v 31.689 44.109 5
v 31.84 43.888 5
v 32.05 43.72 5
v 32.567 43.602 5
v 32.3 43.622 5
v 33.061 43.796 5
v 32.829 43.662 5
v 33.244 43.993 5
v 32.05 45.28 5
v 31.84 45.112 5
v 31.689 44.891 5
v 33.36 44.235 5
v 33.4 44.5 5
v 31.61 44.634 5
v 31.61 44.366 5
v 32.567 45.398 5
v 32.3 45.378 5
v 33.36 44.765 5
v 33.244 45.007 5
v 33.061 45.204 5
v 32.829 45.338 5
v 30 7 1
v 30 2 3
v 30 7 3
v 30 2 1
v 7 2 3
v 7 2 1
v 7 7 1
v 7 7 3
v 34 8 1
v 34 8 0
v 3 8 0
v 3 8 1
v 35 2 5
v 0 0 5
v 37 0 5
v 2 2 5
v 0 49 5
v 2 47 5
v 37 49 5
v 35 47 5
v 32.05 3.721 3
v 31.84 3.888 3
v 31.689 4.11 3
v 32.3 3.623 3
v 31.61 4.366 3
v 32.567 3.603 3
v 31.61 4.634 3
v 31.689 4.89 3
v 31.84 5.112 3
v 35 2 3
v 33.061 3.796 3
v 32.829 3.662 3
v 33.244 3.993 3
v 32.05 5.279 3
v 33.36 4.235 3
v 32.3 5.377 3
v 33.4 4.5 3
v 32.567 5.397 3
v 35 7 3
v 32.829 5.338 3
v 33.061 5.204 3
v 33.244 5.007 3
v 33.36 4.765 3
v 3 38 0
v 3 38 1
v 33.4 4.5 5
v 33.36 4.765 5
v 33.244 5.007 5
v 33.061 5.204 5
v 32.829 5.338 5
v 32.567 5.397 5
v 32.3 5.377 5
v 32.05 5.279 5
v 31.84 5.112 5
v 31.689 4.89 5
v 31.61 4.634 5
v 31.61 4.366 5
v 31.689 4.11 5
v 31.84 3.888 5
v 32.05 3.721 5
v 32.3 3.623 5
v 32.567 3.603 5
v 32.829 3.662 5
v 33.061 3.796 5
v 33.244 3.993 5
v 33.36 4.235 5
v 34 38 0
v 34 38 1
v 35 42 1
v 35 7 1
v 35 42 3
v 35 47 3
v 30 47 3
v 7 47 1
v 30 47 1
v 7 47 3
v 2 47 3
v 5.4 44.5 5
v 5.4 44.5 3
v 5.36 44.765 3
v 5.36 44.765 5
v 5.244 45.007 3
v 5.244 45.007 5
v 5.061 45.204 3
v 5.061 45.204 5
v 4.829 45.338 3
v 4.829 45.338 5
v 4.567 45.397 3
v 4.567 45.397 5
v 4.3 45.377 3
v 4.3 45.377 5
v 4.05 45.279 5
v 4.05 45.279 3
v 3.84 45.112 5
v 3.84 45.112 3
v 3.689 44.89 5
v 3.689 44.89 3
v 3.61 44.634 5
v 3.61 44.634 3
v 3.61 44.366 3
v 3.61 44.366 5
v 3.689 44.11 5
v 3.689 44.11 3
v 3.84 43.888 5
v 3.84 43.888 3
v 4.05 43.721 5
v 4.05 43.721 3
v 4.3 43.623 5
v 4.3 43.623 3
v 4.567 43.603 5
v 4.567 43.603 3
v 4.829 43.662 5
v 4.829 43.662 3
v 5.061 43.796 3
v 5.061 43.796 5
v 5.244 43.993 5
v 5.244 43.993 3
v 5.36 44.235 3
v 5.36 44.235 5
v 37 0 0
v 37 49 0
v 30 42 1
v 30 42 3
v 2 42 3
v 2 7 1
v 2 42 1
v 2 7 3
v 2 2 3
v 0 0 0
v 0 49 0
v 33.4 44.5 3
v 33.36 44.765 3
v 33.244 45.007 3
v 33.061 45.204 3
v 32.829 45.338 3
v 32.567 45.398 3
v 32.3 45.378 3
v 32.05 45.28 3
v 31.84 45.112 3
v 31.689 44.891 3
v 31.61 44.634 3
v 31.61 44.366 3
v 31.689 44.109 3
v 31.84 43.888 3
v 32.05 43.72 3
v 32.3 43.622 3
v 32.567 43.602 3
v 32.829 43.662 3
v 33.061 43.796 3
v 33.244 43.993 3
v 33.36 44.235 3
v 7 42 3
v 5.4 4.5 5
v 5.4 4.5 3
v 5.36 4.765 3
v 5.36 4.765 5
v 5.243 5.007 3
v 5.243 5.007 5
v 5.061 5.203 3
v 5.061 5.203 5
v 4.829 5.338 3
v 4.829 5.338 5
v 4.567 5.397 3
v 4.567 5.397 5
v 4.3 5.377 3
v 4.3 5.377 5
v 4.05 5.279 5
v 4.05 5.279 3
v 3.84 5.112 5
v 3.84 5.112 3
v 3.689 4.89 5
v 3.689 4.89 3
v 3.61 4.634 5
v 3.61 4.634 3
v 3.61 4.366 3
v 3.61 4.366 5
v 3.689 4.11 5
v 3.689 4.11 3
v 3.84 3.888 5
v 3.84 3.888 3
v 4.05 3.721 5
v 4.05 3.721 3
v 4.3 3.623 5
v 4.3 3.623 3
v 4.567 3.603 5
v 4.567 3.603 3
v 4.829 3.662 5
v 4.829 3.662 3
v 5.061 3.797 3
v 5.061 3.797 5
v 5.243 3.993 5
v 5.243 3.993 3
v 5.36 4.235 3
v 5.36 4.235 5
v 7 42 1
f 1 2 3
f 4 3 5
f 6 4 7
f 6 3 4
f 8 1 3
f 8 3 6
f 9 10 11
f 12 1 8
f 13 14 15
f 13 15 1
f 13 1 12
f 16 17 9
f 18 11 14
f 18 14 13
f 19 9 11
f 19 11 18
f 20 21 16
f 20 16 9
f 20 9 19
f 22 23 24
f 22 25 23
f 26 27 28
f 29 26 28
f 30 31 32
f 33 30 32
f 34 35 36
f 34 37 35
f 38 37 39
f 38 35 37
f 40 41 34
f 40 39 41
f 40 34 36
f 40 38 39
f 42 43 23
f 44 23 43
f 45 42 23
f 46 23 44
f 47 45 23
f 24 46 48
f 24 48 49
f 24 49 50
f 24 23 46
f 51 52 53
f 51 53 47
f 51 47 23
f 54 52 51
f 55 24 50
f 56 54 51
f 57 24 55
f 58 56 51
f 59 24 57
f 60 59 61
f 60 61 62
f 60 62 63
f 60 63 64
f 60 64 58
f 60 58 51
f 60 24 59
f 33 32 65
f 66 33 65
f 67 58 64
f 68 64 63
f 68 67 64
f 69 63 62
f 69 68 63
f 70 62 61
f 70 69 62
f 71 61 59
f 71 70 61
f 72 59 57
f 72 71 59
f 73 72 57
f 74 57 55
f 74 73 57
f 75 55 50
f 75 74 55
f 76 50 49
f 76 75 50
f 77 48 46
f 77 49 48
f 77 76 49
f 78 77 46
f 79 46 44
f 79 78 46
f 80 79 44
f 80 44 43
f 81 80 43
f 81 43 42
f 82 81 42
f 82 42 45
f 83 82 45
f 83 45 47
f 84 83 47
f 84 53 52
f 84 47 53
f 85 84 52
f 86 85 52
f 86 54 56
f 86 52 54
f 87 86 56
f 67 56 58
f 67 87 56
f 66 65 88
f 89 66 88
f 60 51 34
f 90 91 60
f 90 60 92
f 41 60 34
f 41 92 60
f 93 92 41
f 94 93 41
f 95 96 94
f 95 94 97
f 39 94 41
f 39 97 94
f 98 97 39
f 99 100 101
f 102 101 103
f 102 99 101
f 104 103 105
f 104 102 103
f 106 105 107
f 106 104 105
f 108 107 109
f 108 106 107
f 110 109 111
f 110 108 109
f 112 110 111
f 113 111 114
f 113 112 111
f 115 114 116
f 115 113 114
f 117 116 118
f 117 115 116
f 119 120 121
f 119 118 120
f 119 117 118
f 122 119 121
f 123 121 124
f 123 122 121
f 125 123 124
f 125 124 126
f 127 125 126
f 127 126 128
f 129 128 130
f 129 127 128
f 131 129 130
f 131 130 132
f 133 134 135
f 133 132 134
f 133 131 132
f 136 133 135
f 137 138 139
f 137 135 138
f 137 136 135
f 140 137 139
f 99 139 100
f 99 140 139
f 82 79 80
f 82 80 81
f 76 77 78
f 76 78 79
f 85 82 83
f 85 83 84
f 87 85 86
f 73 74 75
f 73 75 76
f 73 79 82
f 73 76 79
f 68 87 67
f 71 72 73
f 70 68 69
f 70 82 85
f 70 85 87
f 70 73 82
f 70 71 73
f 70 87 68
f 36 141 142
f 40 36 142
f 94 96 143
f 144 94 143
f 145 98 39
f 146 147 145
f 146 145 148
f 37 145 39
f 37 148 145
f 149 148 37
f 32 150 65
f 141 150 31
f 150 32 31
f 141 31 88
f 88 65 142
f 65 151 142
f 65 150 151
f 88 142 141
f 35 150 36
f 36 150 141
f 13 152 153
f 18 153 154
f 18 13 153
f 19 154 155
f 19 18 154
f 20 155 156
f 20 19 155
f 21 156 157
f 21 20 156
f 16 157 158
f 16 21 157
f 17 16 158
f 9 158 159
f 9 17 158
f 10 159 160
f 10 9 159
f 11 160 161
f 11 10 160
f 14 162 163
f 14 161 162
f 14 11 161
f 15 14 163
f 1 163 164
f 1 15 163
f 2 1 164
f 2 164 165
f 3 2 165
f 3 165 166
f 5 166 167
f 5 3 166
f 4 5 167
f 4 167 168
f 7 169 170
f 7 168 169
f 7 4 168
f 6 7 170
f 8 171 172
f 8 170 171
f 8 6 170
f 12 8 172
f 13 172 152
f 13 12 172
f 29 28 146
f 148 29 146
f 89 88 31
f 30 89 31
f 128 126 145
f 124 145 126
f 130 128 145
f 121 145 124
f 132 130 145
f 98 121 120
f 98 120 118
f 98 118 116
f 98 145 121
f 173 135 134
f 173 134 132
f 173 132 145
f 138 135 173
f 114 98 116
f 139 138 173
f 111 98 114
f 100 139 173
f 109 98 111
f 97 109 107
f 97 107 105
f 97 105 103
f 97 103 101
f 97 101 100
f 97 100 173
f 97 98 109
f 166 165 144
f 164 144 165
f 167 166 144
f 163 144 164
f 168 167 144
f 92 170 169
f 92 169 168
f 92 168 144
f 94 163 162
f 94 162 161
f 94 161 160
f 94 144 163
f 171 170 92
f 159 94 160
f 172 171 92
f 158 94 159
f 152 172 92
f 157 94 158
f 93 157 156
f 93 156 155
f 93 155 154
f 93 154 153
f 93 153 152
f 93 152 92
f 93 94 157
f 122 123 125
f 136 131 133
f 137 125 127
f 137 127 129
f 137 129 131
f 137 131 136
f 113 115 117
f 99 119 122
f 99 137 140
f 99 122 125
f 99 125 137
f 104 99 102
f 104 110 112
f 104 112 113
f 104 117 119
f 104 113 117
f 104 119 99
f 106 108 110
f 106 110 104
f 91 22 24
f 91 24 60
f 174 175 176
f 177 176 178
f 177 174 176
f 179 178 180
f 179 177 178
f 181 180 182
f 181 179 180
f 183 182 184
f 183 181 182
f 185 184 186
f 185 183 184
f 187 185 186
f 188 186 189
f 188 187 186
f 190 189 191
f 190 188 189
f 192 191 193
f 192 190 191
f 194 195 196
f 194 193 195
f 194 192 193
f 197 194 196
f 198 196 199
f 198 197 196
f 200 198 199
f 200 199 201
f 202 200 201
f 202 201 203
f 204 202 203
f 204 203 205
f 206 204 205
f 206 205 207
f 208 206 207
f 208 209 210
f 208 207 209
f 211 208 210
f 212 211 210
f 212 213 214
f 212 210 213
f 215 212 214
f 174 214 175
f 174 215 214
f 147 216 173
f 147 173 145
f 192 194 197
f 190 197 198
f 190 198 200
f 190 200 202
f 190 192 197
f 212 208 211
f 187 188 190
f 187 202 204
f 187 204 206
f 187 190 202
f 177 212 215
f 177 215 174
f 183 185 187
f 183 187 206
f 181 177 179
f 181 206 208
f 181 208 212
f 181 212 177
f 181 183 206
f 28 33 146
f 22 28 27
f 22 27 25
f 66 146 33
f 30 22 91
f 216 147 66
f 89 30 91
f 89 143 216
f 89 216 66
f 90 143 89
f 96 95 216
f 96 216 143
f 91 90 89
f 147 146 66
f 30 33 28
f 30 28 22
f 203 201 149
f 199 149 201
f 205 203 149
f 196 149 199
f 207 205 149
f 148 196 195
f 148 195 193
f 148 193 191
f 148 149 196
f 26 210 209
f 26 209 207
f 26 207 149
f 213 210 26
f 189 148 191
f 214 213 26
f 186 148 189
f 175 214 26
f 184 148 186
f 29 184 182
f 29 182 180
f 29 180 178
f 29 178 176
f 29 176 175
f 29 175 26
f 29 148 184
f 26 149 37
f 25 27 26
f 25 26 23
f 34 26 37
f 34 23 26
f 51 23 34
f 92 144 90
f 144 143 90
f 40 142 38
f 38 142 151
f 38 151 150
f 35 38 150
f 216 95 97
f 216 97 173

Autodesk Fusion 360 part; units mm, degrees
sketch "Sketch1" plane through (0, 0, 0) normal (0, 0, 1) x (1, 0, 0)
  line L0 (0, 0) -> (37, 0)
  line L1 (37, 0) -> (37, 49)
  line L2 (37, 49) -> (0, 49)
  line L3 (0, 49) -> (0, 0)
  line L4 (2, 2) -> (35, 2)
  line L5 (35, 2) -> (35, 47)
  line L6 (35, 47) -> (2, 47)
  line L7 (2, 47) -> (2, 2)
  circle A0 centre (4.5, 4.5) radius 0.8998
  circle A1 centre (32.5, 4.5) radius 0.9
  circle A2 centre (32.5, 44.5) radius 0.9002
  circle A3 centre (4.5, 44.5) radius 0.8999
  line L8 (3, 38) -> (34, 38)
  line L9 (34, 38) -> (34, 8)
  line L10 (34, 8) -> (3, 8)
  line L11 (3, 8) -> (3, 38)
  line L12 (2, 47) -> (7, 47)
  line L13 (7, 47) -> (7, 42)
  line L14 (7, 42) -> (2, 42)
  line L15 (2, 42) -> (2, 47)
  line L16 (35, 47) -> (30, 47)
  line L17 (30, 47) -> (30, 42)
  line L18 (30, 42) -> (35, 42)
  line L19 (35, 42) -> (35, 47)
  line L20 (35, 2) -> (30, 2)
  line L21 (30, 2) -> (30, 7)
  line L22 (30, 7) -> (35, 7)
  line L23 (35, 7) -> (35, 2)
  line L24 (2, 2) -> (7, 2)
  line L25 (7, 2) -> (7, 7)
  line L26 (7, 7) -> (2, 7)
  line L27 (2, 7) -> (2, 2)
extrude "Extrude1" add sketch "Sketch1" along normal blind 1 contours L0 L1 L2 L3 | L4 L7 L24 L25 L26 L27 | L4 L5 L6 L7 L13 L14 L17 L18 L21 L22 L25 L26 | L4 L5 L20 L21 L22 L23 | L6 L7 L12 L13 L14 L15 | L5 L6 L16 L17 L18 L19 | A0 | A1 | A2 | A3
extrude "Extrude2" cut sketch "Sketch1" along normal blind 4 contours L4 L7 L24 L25 L26 L27 | L4 L5 L20 L21 L22 L23 | L6 L7 L12 L13 L14 L15 | L5 L6 L16 L17 L18 L19 | A0 | A1 | A2 | A3
extrude "Extrude3" add sketch "Sketch1" along normal blind 4 contours L4 L7 L24 L25 L26 L27 | L4 L5 L20 L21 L22 L23 | L6 L7 L12 L13 L14 L15 | L5 L6 L16 L17 L18 L19 | A0 | A1 | A2 | A3
extrude "Extrude4" cut sketch "Sketch1" along normal blind 5 contours A0 | A1 | A2 | A3
extrude "Extrude5" add sketch "Sketch1" along normal blind 6 contours A0 | A1 | A2 | A3
extrude "Extrude6" cut sketch "Sketch1" along normal blind 4 contours L0 L1 L2 L3
extrude "Extrude7" add sketch "Sketch1" along normal blind 6 contours L0 L1 L2 L3
extrude "Extrude8" cut 4 faces at (4.5224, 2.5343, 4) (32.5224, 2.5342, 4) (4.5224, 42.5342, 4) (32.4776, 42.5341, 4) along direction (0, 0, -1) blind 1
extrude "Extrude9" cut 5 faces at (32.5668, 44.2075, 6) (0.6667, 17, 6) (4.65, 44.2402, 6) (4.7199, 4.7934, 6) (32.7134, 4.9094, 6) along direction (0, 0, -1) blind 1
